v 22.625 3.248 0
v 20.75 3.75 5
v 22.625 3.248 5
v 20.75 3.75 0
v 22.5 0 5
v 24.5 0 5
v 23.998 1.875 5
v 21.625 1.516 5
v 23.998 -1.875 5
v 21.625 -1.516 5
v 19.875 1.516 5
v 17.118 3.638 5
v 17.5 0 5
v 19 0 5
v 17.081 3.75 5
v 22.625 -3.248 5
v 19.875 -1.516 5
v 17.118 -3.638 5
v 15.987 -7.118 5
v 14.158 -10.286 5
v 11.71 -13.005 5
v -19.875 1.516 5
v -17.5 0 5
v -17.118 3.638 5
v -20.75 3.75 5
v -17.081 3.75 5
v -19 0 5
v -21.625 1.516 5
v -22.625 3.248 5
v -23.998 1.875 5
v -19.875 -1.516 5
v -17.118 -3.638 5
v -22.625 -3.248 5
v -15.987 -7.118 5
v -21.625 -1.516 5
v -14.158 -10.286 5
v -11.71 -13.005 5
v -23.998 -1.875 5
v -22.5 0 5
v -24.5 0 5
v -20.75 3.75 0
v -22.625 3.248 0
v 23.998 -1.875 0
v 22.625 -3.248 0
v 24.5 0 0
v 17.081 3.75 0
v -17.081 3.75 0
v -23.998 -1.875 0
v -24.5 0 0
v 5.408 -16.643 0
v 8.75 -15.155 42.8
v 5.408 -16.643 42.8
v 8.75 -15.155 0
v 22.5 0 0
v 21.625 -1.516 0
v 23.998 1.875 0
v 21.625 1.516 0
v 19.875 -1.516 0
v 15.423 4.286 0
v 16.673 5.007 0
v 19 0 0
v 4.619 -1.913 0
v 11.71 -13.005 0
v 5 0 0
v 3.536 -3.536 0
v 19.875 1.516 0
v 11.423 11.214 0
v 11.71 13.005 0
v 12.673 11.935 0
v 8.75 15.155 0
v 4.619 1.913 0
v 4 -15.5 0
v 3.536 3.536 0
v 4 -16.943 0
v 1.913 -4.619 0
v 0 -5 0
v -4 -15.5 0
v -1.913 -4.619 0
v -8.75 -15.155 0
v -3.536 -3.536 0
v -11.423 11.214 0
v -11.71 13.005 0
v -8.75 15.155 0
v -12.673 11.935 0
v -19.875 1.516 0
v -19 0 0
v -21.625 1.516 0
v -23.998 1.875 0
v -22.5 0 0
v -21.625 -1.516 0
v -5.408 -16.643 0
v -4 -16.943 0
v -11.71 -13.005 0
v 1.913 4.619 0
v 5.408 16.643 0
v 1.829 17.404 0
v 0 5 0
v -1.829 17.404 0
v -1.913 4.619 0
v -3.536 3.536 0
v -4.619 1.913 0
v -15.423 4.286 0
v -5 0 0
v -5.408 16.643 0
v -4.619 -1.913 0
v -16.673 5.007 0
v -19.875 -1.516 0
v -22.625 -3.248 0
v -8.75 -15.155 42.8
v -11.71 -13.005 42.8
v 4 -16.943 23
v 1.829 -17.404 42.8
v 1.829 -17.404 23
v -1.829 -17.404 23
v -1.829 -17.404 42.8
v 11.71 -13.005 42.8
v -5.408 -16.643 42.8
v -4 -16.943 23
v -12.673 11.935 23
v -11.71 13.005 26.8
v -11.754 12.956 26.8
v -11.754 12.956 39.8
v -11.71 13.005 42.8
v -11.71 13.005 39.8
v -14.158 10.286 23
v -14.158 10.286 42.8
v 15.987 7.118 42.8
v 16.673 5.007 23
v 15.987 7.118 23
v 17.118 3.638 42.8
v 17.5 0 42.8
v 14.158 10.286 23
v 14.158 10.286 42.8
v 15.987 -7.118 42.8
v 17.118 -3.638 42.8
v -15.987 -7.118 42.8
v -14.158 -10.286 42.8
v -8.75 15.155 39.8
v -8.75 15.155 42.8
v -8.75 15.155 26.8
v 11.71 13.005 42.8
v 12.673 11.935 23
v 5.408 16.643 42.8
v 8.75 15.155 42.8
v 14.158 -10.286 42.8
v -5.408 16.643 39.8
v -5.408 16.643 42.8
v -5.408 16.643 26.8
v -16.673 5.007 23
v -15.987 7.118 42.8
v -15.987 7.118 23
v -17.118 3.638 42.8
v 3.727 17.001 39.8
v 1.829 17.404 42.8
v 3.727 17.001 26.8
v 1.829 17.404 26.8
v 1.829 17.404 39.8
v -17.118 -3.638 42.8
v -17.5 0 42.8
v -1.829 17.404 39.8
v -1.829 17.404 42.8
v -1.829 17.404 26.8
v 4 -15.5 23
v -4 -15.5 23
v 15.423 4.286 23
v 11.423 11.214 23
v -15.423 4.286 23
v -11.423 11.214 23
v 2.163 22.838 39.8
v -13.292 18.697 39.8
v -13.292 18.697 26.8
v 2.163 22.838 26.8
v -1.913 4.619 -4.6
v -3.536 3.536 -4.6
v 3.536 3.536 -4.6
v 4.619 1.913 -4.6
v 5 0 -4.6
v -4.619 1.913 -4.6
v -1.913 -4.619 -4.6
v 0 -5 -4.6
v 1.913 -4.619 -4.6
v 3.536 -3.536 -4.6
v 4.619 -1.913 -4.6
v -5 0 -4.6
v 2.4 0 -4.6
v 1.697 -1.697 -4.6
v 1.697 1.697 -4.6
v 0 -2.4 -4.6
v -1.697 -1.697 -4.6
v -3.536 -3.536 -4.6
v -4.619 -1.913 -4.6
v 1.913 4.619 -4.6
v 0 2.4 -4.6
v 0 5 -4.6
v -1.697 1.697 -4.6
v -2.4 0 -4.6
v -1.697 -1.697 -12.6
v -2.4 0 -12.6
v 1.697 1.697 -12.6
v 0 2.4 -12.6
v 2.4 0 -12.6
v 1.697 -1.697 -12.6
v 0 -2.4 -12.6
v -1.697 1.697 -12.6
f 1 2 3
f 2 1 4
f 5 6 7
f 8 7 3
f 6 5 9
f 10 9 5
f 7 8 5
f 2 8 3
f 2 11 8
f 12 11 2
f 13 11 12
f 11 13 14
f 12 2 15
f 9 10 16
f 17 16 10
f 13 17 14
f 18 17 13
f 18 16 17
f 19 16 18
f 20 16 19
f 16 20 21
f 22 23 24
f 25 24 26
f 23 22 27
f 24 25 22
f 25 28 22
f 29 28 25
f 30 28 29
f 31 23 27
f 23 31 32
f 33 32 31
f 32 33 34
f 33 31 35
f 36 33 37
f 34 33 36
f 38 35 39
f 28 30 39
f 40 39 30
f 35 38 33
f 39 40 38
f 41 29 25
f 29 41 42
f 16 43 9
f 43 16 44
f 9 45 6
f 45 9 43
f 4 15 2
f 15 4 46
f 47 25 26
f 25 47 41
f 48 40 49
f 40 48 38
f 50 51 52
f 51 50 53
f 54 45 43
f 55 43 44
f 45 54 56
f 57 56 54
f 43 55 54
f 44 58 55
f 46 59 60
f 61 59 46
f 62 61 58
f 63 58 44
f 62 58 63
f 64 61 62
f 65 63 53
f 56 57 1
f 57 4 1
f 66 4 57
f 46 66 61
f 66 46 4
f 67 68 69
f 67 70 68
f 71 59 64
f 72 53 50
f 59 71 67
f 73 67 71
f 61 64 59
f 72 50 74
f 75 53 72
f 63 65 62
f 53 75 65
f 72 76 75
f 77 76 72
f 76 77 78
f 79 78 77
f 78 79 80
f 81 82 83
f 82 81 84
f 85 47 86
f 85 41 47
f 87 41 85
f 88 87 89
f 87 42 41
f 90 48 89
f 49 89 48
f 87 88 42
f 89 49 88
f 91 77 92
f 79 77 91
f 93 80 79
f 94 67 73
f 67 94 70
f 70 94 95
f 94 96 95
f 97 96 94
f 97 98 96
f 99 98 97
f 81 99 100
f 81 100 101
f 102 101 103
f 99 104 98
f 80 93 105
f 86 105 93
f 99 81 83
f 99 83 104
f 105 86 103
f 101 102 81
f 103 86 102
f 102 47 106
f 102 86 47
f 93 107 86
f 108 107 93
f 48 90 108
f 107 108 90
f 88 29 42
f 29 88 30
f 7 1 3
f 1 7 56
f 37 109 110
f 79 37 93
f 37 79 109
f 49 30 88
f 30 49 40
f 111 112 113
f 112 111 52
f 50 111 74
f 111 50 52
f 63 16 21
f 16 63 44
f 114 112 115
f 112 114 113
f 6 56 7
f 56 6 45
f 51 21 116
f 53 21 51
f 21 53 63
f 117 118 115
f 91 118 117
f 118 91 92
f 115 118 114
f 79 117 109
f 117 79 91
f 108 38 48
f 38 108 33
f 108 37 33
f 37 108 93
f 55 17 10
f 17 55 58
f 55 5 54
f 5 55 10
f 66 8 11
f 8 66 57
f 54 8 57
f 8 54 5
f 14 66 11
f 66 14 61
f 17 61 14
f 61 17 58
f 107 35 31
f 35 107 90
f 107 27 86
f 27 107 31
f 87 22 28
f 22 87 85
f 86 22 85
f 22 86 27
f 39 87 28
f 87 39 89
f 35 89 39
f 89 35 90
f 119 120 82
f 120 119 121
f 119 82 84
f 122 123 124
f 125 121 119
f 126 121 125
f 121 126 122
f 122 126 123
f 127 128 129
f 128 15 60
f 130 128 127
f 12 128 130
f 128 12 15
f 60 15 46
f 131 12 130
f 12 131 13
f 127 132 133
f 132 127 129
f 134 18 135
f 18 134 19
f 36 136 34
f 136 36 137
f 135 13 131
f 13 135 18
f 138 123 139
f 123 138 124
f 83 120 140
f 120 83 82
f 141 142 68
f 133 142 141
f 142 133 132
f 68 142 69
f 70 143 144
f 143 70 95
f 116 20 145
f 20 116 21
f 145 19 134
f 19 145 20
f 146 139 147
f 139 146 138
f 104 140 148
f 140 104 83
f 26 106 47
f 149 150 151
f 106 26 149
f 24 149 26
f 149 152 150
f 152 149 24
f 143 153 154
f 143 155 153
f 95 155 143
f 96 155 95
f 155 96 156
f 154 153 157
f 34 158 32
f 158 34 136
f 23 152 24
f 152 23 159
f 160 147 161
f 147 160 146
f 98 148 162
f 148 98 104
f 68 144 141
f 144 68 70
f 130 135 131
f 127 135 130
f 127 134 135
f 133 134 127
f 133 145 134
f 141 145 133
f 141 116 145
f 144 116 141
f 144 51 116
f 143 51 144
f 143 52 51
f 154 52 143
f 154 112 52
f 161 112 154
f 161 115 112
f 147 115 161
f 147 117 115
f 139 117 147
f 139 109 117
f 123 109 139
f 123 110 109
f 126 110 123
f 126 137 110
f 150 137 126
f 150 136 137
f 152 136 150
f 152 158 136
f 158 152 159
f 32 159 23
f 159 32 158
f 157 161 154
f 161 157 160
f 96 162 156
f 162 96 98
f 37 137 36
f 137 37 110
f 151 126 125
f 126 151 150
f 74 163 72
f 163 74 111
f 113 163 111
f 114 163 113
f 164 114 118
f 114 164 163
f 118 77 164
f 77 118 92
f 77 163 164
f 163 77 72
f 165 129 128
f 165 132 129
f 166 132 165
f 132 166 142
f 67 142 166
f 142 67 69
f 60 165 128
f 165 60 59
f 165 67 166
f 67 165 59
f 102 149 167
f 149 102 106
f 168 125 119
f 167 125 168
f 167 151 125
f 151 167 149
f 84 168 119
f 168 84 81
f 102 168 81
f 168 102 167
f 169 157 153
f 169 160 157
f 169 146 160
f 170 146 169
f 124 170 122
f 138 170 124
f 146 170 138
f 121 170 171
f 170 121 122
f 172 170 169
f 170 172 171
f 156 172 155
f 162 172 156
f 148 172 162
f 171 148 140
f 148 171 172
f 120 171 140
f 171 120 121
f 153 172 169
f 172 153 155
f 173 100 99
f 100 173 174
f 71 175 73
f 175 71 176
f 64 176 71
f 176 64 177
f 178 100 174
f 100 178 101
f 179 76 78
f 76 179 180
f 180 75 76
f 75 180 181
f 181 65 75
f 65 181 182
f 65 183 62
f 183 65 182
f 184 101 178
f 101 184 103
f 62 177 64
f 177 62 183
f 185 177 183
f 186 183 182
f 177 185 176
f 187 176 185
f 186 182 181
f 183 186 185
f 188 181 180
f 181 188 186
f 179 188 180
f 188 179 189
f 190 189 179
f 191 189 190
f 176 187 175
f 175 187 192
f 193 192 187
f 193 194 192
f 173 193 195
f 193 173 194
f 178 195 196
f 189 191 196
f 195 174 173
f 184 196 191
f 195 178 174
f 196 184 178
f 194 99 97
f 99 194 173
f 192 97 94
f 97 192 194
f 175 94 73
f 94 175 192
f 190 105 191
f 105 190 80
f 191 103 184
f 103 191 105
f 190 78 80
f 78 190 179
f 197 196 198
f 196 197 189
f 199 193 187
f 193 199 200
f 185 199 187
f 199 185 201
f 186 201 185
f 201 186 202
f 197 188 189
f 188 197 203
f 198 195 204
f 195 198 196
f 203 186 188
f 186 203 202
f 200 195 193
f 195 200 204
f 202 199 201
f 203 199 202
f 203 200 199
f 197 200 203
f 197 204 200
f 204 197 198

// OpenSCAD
// PG35L motor by EiNSTeiN_ <einstein@g3nius.org>


PG35L(false);

module PG35L(mini_hyena=true) {

	difference() {
		union() {
		cylinder(h=42.8,r=35/2); // motor body
		// wings..
		difference() {
			hull() {
				intersection() {
					translate([-50/2, -35/2, 0]) cube([50,35/2,5]);
					cylinder(h=5,r=35/2);
				}
				translate([49/2-7.5/2,0,0]) cylinder(h=5,r=7.5/2);
				translate([-49/2+7.5/2,0,0]) cylinder(h=5,r=7.5/2);
			}
			translate([49/2-7.5/2,0,0]) cylinder(h=5,r=3.5/2);
			translate([-49/2+7.5/2,0,0]) cylinder(h=5,r=3.5/2);
		}
		}
		for(i=[0:2]) {
			rotate([0,0,120*i]) translate([0, -35/2+0.5, 23/2]) cube([8, 3, 23], center=true);
		}
	}

	rotate([0,0,15]) translate([0,50/2-7,42.8-13/2-3]) cube([16, 7, 13], center=true);

	translate([0,0,-4.6]) cylinder(h=4.6,r=10/2); // motor shaft
	translate([0,0,-4.6-8]) cylinder(h=8,r=4.8/2); // motor shaft
	
	// mini hyena: H=10mm, ID=5mm, OD=12.5mm
	if(mini_hyena) #translate([0,0,-5]) rotate([180,0,0]) difference() {
		union() {
			cylinder(h=5.5,r=12.5/2);
			translate([0,0,5.5]) cylinder(h=2,r2=10.5/2, r1=12.5/2);
			translate([0,0,5.5+2]) cylinder(h=2, r2=12.5/2,r1=10.5/2);
			translate([0,0,9.5]) cylinder(h=0.5,r=12.5/2);
		}
		cylinder(h=10,r=5/2);
	}
}
